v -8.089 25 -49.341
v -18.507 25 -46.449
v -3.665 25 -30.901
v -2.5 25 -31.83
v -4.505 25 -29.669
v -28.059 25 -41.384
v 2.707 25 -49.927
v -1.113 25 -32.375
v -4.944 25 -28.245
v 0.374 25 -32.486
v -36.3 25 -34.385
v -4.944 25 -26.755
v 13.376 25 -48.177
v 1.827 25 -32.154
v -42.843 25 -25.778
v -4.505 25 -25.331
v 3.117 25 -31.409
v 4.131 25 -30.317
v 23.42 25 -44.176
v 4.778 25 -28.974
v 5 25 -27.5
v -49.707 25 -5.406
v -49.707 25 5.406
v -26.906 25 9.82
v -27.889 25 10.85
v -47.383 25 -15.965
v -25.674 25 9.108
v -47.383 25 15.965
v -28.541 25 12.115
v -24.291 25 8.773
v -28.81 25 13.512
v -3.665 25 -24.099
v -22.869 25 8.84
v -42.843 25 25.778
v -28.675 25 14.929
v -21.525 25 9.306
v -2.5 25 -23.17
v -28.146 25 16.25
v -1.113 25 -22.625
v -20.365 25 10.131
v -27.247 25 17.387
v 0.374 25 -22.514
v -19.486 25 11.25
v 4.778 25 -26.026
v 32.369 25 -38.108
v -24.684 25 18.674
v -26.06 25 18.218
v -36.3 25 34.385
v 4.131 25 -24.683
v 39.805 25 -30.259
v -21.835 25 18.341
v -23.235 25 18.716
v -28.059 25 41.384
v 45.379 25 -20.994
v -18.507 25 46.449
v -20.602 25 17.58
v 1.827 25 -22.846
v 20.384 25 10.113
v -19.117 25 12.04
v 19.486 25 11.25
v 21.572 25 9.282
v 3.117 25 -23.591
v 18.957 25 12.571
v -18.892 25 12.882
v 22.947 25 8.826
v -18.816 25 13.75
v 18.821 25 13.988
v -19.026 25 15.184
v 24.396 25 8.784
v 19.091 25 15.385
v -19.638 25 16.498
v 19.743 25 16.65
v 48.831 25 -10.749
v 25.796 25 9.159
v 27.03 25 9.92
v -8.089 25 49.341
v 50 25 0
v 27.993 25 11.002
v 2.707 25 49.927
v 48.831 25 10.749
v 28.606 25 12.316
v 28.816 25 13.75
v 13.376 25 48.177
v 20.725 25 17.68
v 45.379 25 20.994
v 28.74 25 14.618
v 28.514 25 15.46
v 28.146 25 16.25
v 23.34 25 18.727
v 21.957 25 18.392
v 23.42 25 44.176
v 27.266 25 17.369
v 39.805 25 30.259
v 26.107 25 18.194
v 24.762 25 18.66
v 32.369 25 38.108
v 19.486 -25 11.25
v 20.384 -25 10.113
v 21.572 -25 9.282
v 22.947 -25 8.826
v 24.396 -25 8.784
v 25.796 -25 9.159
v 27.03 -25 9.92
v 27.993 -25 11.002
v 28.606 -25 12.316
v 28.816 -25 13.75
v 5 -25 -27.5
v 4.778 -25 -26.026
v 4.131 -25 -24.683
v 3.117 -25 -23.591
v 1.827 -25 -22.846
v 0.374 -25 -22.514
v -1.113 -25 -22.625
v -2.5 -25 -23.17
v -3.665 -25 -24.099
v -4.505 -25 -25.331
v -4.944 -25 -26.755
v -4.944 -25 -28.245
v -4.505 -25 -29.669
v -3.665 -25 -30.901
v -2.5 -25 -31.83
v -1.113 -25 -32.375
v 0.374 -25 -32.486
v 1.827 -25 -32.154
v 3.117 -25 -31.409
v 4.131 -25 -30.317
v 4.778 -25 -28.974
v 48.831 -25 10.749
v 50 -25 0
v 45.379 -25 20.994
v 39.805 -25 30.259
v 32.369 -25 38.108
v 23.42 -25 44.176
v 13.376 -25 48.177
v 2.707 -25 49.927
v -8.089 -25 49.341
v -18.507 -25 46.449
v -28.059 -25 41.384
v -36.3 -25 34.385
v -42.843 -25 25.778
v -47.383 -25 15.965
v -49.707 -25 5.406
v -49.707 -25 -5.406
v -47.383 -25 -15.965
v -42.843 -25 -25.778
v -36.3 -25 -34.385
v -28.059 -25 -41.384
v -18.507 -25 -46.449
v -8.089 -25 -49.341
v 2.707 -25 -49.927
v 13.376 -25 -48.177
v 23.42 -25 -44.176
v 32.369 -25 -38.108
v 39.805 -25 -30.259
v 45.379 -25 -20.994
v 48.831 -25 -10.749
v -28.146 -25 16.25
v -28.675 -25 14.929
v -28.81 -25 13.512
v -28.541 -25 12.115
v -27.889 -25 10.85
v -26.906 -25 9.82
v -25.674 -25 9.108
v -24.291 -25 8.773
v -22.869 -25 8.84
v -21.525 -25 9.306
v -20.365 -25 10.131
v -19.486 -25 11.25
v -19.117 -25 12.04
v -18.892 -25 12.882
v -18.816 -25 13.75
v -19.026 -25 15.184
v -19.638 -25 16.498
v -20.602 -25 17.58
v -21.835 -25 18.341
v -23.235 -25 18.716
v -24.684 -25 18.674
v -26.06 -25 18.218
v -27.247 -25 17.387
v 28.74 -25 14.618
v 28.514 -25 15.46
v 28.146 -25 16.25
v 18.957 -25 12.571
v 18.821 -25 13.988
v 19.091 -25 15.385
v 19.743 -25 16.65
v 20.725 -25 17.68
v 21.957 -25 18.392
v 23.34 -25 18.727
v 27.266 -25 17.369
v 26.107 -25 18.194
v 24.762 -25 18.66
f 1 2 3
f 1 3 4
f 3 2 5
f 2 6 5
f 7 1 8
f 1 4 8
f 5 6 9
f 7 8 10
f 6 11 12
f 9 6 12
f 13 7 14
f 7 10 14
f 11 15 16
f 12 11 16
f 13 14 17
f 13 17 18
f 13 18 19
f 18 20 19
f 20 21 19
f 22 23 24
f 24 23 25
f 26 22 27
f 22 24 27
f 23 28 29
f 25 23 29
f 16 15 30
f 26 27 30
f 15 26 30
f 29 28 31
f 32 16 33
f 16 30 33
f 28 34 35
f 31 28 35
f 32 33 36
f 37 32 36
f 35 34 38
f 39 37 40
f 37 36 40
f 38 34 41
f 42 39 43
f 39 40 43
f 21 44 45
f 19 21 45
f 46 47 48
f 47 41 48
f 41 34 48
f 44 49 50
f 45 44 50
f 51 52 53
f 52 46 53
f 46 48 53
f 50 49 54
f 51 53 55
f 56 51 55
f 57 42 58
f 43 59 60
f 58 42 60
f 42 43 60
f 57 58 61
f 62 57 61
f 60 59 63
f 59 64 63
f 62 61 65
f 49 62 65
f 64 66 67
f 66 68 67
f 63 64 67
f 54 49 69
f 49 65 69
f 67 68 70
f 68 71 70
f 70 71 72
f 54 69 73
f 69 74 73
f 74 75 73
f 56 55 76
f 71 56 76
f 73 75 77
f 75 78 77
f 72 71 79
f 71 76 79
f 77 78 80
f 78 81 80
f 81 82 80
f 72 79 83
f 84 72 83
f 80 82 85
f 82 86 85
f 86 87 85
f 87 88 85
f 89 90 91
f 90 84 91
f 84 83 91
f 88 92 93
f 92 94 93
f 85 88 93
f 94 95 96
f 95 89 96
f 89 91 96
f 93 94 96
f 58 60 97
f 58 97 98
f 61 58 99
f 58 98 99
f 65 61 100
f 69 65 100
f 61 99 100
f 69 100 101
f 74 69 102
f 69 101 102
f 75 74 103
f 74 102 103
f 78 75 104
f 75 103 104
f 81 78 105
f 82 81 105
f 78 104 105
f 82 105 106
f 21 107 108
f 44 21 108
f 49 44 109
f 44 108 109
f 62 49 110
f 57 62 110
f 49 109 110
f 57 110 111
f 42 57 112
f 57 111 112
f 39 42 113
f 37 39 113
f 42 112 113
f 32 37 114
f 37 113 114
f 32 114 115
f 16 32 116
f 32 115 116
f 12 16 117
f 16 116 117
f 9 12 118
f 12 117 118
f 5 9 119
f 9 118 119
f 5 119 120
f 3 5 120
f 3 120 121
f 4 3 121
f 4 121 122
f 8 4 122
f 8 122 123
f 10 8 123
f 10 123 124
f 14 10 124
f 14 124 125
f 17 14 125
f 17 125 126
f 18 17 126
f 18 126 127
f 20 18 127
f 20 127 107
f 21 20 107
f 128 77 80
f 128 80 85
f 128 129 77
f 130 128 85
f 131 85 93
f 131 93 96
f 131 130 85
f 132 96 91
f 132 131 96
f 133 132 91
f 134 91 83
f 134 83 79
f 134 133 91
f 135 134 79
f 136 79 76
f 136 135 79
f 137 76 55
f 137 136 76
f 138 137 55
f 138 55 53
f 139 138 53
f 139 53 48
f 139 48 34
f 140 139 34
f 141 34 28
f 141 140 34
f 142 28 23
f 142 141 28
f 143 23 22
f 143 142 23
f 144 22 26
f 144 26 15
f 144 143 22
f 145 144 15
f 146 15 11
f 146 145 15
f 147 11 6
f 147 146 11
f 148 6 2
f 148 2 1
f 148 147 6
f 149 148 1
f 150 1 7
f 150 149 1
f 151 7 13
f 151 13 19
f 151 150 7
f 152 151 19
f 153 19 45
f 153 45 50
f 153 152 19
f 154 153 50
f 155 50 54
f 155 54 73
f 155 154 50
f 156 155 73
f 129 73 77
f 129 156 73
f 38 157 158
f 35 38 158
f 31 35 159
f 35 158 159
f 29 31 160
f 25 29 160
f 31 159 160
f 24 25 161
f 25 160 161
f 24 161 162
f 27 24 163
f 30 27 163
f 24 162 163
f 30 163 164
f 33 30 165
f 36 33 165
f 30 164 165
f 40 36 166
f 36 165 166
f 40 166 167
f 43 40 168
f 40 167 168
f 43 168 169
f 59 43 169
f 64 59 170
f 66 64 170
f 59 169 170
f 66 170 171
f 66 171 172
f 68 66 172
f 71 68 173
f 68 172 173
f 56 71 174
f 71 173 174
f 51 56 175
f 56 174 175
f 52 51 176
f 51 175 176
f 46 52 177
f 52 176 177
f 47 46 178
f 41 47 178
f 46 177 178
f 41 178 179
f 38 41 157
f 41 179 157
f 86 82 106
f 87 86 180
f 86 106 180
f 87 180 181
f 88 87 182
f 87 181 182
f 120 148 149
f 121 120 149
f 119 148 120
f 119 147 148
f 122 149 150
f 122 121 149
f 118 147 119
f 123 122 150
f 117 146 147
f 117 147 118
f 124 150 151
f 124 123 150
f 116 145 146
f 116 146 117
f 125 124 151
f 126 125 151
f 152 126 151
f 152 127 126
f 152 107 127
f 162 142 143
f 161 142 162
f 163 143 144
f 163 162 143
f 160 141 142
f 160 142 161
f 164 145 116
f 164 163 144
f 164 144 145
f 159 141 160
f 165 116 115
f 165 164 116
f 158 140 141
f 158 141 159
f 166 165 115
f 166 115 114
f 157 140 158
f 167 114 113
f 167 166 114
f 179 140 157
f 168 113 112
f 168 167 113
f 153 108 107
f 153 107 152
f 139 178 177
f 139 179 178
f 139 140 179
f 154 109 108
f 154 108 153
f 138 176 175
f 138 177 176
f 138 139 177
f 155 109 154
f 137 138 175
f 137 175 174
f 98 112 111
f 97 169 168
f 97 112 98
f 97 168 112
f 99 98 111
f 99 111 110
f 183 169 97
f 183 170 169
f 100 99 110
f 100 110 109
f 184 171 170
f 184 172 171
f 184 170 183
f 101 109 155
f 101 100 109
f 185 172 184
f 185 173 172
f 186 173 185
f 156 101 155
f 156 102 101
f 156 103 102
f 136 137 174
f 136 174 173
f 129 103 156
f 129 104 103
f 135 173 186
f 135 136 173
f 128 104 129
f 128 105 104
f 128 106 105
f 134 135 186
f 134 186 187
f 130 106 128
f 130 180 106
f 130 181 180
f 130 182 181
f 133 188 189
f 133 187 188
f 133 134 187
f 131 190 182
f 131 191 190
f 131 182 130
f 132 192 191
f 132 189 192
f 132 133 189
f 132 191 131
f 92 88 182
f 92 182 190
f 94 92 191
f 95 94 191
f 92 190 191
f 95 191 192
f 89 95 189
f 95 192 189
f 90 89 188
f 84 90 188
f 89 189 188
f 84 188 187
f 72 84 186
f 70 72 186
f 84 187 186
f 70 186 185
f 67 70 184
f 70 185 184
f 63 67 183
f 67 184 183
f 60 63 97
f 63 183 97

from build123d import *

# Parameters (mm, degrees)
F0_R     = 50
F1_DEPTH = 25
F2_R     = 5
F3_DEPTH = 74


with BuildPart() as f1:
    # F0 (on Front) → F1 (new body, symmetric)
    with BuildSketch(Plane.XZ):
        Circle(F0_R)
    extrude(amount=F1_DEPTH, both=True)

    # F2 (on face) → F3 (cut)
    with BuildSketch(Plane.XZ.offset(25)):
        with BuildLine():
            ThreePointArc((-19.485572, 11.25), (-18.986069, 12.455905), (-18.815699, 13.75))
            ThreePointArc((-18.815699, 13.75), (-22.521603, 18.579629), (-28.145826, 16.25))
            Line((-28.145826, 16.25), (-19.485572, 11.25))
        make_face()
        with BuildLine():
            ThreePointArc((28.145826, 16.25), (21.315699, 18.080127), (19.485572, 11.25))
            Line((19.485572, 11.25), (28.145826, 16.25))
        make_face()
        with BuildLine():
            Line((28.145826, 16.25), (19.485572, 11.25))
            ThreePointArc((19.485572, 11.25), (25.109794, 8.920371), (28.815699, 13.75))
            ThreePointArc((28.815699, 13.75), (28.645328, 15.044095), (28.145826, 16.25))
        make_face()
        with BuildLine():
            Line((-19.485572, 11.25), (-28.145826, 16.25))
            ThreePointArc((-28.145826, 16.25), (-26.315699, 9.419873), (-19.485572, 11.25))
        make_face()
        with Locations((0, -27.5)):
            Circle(F2_R)
    extrude(amount=-F3_DEPTH, mode=Mode.SUBTRACT)


solid = f1.part
